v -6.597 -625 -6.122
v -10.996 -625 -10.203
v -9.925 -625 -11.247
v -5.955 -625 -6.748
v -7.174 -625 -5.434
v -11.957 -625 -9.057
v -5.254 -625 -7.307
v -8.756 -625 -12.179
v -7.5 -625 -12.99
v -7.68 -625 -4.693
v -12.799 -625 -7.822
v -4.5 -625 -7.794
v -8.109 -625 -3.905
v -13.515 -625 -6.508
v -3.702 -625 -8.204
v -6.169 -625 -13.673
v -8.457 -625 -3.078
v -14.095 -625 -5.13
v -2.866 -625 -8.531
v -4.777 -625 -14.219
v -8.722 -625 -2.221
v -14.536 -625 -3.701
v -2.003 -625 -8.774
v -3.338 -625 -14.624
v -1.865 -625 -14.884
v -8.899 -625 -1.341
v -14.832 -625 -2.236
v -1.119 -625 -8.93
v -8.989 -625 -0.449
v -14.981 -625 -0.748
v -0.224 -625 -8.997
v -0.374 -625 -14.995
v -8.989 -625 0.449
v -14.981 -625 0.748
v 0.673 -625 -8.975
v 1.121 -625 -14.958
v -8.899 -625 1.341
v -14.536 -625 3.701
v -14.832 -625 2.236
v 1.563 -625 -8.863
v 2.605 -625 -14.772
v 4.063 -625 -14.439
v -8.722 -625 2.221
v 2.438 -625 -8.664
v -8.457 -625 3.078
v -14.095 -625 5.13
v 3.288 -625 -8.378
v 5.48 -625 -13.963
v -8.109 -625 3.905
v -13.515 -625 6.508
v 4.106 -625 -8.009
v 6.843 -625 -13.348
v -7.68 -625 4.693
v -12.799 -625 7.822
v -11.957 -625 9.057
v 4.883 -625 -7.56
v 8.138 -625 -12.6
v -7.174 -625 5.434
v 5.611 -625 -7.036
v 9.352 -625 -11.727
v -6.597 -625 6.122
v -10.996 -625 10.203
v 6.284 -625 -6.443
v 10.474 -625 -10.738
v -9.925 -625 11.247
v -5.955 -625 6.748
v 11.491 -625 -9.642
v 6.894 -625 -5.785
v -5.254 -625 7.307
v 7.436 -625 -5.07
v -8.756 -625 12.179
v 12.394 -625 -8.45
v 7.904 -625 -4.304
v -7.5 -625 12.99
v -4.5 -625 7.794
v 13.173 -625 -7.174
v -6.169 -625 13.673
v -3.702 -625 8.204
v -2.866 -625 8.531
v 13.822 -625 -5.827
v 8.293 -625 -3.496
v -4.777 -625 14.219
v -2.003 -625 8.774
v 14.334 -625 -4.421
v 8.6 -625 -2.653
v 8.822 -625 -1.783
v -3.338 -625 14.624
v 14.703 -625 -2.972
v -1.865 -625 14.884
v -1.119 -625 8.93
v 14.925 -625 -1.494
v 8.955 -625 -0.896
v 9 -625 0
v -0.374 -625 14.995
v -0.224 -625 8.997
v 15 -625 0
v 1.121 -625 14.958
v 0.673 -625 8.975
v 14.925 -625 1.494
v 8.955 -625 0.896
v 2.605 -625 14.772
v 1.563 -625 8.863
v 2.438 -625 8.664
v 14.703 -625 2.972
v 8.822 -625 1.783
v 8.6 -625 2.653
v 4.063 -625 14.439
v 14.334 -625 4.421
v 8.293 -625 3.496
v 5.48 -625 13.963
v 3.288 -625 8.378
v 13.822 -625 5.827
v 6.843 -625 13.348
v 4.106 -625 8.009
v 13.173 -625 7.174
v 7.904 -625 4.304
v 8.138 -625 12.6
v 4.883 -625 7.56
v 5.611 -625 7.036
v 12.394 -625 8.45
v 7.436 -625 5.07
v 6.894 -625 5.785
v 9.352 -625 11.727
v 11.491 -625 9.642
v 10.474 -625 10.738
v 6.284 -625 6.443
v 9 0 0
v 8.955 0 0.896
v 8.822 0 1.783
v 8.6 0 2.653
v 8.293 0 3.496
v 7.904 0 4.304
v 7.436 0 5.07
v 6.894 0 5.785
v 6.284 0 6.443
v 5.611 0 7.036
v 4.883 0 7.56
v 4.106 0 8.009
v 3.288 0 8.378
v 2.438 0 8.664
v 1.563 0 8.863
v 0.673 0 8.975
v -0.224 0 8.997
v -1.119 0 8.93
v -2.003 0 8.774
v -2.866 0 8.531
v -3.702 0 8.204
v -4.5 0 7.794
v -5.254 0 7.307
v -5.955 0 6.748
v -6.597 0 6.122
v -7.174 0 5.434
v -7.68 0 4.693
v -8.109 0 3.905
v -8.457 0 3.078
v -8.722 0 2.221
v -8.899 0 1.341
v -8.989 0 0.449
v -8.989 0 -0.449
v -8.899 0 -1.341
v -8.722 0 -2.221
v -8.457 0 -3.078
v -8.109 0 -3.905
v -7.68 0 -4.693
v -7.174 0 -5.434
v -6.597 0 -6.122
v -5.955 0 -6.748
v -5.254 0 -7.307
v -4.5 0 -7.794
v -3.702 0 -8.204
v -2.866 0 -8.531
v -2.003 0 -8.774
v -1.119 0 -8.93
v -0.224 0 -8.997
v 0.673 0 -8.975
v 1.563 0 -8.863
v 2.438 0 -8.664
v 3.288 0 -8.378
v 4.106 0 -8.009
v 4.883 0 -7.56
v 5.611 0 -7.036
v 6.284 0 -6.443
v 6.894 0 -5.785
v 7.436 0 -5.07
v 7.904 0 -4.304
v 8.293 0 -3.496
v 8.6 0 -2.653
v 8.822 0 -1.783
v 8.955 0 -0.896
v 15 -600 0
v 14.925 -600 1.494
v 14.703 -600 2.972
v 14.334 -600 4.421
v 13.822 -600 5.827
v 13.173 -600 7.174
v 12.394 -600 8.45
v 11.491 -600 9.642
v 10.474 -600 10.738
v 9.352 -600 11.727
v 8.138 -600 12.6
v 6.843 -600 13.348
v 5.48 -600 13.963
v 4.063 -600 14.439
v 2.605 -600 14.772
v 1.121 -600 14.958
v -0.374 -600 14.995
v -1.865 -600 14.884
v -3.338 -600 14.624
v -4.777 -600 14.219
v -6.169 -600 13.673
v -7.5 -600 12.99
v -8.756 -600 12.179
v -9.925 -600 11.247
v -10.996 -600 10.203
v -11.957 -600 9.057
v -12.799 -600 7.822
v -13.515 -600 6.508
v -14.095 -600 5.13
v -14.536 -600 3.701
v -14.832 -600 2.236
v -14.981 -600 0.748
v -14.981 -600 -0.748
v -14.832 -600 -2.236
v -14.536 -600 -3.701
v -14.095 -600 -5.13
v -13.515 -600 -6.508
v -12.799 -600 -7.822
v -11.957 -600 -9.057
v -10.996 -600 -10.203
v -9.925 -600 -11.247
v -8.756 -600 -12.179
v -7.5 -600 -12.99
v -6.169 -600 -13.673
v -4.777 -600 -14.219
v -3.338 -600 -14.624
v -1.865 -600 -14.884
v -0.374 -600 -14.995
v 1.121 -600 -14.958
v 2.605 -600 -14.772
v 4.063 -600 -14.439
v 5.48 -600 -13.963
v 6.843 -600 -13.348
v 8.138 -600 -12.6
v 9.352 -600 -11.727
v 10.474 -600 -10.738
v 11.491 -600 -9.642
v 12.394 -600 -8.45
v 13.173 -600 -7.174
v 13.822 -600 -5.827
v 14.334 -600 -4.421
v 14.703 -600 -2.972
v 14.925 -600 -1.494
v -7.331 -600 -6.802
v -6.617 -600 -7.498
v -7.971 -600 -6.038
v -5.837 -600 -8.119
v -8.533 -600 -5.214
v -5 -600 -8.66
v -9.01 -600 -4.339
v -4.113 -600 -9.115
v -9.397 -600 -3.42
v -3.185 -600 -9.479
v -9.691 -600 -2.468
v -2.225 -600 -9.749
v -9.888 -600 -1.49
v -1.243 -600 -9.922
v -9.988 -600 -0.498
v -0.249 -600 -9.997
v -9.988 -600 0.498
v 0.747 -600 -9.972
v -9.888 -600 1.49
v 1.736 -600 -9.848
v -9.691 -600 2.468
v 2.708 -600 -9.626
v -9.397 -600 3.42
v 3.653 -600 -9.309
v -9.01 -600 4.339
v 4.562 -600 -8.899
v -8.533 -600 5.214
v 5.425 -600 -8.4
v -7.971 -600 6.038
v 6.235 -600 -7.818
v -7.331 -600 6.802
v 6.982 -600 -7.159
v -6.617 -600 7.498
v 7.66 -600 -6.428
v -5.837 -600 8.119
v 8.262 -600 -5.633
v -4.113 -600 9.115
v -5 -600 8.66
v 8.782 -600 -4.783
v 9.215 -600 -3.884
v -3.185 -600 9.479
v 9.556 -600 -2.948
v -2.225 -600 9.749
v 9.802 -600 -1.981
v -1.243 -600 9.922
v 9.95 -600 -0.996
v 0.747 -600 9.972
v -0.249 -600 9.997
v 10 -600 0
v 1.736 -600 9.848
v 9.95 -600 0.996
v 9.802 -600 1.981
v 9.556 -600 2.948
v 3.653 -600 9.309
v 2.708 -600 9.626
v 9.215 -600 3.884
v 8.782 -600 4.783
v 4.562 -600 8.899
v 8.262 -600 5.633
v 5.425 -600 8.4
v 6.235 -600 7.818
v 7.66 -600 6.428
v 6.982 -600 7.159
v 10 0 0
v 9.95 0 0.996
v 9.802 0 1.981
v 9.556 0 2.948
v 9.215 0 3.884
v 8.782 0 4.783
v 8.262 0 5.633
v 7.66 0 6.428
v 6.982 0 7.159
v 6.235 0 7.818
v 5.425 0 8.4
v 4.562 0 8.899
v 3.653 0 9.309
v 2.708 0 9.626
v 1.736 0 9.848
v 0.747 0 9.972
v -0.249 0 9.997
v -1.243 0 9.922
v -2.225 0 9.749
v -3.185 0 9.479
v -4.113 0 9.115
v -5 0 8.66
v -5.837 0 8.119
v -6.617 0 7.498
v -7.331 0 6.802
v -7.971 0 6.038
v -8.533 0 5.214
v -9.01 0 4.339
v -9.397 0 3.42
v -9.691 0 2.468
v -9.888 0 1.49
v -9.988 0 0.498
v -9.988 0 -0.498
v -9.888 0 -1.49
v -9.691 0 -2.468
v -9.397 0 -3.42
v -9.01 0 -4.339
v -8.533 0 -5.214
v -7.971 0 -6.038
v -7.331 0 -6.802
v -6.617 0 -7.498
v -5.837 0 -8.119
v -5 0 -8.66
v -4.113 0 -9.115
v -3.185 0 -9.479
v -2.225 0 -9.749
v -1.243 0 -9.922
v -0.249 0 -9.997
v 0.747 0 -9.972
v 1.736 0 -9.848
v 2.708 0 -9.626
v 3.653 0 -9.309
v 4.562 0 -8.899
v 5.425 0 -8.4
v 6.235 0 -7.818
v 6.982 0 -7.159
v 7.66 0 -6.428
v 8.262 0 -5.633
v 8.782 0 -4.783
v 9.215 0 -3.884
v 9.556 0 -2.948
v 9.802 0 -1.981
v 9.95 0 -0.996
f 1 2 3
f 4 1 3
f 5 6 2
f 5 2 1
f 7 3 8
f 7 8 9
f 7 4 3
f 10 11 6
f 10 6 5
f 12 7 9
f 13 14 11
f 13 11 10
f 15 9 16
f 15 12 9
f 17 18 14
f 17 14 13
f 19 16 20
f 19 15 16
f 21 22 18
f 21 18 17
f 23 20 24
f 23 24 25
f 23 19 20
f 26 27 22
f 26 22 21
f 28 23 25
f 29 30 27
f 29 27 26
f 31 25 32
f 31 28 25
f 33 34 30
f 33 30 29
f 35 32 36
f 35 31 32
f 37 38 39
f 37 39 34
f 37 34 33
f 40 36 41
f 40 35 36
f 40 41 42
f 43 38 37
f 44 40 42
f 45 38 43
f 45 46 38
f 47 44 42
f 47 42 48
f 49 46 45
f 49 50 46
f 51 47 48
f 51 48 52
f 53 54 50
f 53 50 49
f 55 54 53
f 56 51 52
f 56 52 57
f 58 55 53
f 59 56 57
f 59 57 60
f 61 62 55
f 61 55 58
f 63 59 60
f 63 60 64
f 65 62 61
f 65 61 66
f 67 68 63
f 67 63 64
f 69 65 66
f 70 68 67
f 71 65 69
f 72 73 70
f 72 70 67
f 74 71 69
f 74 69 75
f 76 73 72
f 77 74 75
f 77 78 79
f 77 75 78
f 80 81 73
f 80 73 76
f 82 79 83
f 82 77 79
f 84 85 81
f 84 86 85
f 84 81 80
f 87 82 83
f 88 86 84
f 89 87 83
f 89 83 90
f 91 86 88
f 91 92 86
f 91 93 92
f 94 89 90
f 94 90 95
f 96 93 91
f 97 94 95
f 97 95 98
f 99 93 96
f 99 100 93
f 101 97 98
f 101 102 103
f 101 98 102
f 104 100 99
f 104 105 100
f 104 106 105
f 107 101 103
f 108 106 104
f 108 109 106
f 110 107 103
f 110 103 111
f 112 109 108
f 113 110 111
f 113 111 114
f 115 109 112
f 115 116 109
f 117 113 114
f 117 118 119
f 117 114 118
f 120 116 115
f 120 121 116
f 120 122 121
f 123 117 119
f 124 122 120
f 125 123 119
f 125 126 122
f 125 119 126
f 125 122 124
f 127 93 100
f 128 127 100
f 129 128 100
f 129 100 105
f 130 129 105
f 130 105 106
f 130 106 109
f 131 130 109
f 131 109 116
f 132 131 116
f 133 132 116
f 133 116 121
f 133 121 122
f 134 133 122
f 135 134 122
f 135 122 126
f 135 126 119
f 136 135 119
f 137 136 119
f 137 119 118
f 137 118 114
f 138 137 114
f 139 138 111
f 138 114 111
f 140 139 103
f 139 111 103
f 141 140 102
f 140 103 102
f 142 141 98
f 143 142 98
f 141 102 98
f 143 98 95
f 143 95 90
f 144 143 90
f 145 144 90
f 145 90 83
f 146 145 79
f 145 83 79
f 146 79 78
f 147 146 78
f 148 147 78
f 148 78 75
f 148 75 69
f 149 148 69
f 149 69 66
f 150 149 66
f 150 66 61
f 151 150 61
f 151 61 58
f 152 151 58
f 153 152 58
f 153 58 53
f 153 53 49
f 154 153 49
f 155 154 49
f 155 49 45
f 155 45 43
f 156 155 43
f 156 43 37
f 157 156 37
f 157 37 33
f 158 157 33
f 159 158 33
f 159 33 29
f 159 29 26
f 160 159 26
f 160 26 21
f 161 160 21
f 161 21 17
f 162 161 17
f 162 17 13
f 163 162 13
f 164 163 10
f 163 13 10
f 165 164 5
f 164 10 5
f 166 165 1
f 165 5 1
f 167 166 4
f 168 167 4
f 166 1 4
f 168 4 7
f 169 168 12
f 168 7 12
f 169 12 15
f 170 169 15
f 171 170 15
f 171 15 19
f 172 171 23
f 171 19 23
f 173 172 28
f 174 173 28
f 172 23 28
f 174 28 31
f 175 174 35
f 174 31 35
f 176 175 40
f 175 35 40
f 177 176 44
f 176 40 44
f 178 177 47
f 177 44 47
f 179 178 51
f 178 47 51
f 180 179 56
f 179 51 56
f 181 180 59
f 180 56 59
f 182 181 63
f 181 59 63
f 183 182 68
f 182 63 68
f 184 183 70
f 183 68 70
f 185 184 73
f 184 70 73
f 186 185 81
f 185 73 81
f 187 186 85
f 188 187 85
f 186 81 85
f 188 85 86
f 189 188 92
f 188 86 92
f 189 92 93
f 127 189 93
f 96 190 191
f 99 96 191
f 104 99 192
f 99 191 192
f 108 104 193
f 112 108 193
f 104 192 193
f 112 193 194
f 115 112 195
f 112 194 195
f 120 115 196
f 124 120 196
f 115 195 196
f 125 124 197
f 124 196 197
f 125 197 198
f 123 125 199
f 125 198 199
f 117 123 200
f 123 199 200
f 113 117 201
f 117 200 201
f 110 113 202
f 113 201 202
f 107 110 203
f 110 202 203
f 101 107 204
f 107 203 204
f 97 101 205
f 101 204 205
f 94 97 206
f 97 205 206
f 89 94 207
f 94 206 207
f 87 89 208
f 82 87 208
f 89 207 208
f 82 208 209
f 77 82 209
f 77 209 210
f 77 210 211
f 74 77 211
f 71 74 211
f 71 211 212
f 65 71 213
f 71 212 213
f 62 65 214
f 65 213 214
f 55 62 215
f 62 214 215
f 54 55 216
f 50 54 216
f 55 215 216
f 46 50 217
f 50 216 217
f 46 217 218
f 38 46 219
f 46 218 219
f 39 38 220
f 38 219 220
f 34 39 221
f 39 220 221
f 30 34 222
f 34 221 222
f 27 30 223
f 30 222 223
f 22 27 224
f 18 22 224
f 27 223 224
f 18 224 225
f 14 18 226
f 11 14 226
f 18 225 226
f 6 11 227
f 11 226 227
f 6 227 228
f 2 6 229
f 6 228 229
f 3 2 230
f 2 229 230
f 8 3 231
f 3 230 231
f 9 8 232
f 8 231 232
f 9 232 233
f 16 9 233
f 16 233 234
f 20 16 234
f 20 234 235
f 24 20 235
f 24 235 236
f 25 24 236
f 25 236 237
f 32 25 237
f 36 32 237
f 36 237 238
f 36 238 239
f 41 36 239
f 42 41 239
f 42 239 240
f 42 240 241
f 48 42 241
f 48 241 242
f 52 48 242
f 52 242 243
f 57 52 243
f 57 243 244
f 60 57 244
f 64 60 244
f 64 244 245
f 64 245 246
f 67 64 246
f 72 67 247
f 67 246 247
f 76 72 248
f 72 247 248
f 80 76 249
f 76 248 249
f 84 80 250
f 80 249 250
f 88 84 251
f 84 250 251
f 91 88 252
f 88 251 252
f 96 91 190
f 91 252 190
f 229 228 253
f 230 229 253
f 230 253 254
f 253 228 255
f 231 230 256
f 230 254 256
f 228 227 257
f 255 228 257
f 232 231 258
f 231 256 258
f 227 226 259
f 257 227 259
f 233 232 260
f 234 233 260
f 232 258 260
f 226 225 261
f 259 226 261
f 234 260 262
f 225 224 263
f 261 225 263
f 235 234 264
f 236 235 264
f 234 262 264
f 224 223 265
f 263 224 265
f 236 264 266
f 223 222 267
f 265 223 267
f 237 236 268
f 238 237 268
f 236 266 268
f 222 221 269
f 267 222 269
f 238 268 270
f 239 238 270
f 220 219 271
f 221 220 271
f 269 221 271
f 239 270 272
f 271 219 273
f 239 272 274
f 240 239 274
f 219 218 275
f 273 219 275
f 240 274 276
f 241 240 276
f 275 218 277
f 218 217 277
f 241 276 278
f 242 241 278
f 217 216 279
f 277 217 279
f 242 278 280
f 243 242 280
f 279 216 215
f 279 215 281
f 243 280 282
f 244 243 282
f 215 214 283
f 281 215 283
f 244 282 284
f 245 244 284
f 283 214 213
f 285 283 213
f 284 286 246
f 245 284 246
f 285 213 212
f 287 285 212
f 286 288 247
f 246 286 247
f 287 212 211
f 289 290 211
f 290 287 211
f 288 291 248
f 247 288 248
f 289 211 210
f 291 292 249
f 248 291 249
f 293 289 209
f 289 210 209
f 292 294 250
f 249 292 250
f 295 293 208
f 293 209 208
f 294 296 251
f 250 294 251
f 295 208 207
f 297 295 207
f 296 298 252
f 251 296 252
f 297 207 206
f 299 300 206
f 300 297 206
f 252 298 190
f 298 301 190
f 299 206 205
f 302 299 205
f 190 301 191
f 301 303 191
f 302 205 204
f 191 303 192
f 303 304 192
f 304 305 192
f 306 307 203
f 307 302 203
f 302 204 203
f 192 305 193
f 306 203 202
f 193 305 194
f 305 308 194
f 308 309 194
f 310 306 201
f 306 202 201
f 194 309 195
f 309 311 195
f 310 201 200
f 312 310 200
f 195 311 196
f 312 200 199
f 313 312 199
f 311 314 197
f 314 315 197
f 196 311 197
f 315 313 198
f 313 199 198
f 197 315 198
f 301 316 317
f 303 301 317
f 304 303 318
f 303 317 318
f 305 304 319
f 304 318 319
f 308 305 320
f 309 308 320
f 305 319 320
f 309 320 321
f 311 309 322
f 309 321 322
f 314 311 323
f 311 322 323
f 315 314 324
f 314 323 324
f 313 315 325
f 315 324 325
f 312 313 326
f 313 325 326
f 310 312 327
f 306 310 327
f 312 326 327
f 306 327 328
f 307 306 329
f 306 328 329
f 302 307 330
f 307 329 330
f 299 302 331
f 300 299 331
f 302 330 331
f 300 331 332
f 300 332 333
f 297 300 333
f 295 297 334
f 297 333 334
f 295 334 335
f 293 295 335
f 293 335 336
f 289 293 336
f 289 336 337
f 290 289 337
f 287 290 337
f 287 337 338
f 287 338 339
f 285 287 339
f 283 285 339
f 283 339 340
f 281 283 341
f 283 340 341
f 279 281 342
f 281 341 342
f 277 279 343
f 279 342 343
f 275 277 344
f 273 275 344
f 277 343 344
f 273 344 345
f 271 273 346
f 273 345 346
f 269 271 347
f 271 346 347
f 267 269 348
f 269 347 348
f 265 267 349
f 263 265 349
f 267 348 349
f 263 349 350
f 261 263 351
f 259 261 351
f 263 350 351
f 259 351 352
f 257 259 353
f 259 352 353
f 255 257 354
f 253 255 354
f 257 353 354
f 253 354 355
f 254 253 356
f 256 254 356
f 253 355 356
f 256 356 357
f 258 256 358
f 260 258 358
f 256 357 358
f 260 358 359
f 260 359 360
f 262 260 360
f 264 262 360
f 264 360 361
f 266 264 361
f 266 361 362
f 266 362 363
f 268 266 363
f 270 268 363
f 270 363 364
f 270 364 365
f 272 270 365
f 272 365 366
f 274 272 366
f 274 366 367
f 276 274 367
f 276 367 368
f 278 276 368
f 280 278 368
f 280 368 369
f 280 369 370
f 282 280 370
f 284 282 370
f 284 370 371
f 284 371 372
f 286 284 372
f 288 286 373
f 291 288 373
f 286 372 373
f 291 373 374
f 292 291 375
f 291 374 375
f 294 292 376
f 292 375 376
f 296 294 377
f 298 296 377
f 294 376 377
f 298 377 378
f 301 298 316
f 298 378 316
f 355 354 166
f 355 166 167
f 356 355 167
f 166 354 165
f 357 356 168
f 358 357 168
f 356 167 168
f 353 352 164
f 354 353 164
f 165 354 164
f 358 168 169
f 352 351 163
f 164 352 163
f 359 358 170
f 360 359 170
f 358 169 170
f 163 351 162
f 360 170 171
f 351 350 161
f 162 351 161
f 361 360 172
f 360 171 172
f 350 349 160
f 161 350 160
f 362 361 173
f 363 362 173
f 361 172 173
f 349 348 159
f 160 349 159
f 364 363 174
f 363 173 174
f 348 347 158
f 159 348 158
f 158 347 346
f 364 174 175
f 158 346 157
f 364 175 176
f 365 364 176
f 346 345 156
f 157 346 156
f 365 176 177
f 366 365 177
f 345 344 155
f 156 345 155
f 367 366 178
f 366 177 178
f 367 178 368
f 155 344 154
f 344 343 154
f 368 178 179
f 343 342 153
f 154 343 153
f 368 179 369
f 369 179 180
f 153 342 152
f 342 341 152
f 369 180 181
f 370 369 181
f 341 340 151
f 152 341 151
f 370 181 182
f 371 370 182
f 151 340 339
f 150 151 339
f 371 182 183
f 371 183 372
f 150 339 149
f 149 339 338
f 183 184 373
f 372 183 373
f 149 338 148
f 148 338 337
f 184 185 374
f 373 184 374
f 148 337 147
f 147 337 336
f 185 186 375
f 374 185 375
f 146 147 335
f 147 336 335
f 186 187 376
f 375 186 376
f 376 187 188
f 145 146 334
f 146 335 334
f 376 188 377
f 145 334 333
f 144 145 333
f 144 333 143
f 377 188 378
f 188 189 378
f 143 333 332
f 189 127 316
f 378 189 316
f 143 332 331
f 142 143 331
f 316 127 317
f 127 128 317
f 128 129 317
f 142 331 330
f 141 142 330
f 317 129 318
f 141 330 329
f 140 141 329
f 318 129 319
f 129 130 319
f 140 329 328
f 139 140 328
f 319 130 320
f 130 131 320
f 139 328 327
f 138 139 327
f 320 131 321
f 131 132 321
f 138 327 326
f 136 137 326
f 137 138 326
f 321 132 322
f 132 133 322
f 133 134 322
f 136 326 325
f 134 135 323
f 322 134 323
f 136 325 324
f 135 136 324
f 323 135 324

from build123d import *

# Parameters (mm, degrees)
F0_R     = 10
F1_DEPTH = 600
F2_R     = 15
F2_R_2   = 10
F3_DEPTH = 25
F4_R     = 9
F5_DEPTH = 700


with BuildPart() as f1:
    # F0 (on Front) → F1 (new body)
    with BuildSketch(Plane.XZ):
        Circle(F0_R)
    extrude(amount=F1_DEPTH)

    # F2 (on face) → F3 (join)
    with BuildSketch(Plane.XZ.offset(600)):
        Circle(F2_R)
        Circle(F2_R_2, mode=Mode.SUBTRACT)
        Circle(F2_R_2)
    extrude(amount=F3_DEPTH)

    # F4 (on face) → F5 (cut)
    with BuildSketch(Plane.XZ.offset(625)):
        Circle(F4_R)
    extrude(amount=-F5_DEPTH, mode=Mode.SUBTRACT)


solid = f1.part
